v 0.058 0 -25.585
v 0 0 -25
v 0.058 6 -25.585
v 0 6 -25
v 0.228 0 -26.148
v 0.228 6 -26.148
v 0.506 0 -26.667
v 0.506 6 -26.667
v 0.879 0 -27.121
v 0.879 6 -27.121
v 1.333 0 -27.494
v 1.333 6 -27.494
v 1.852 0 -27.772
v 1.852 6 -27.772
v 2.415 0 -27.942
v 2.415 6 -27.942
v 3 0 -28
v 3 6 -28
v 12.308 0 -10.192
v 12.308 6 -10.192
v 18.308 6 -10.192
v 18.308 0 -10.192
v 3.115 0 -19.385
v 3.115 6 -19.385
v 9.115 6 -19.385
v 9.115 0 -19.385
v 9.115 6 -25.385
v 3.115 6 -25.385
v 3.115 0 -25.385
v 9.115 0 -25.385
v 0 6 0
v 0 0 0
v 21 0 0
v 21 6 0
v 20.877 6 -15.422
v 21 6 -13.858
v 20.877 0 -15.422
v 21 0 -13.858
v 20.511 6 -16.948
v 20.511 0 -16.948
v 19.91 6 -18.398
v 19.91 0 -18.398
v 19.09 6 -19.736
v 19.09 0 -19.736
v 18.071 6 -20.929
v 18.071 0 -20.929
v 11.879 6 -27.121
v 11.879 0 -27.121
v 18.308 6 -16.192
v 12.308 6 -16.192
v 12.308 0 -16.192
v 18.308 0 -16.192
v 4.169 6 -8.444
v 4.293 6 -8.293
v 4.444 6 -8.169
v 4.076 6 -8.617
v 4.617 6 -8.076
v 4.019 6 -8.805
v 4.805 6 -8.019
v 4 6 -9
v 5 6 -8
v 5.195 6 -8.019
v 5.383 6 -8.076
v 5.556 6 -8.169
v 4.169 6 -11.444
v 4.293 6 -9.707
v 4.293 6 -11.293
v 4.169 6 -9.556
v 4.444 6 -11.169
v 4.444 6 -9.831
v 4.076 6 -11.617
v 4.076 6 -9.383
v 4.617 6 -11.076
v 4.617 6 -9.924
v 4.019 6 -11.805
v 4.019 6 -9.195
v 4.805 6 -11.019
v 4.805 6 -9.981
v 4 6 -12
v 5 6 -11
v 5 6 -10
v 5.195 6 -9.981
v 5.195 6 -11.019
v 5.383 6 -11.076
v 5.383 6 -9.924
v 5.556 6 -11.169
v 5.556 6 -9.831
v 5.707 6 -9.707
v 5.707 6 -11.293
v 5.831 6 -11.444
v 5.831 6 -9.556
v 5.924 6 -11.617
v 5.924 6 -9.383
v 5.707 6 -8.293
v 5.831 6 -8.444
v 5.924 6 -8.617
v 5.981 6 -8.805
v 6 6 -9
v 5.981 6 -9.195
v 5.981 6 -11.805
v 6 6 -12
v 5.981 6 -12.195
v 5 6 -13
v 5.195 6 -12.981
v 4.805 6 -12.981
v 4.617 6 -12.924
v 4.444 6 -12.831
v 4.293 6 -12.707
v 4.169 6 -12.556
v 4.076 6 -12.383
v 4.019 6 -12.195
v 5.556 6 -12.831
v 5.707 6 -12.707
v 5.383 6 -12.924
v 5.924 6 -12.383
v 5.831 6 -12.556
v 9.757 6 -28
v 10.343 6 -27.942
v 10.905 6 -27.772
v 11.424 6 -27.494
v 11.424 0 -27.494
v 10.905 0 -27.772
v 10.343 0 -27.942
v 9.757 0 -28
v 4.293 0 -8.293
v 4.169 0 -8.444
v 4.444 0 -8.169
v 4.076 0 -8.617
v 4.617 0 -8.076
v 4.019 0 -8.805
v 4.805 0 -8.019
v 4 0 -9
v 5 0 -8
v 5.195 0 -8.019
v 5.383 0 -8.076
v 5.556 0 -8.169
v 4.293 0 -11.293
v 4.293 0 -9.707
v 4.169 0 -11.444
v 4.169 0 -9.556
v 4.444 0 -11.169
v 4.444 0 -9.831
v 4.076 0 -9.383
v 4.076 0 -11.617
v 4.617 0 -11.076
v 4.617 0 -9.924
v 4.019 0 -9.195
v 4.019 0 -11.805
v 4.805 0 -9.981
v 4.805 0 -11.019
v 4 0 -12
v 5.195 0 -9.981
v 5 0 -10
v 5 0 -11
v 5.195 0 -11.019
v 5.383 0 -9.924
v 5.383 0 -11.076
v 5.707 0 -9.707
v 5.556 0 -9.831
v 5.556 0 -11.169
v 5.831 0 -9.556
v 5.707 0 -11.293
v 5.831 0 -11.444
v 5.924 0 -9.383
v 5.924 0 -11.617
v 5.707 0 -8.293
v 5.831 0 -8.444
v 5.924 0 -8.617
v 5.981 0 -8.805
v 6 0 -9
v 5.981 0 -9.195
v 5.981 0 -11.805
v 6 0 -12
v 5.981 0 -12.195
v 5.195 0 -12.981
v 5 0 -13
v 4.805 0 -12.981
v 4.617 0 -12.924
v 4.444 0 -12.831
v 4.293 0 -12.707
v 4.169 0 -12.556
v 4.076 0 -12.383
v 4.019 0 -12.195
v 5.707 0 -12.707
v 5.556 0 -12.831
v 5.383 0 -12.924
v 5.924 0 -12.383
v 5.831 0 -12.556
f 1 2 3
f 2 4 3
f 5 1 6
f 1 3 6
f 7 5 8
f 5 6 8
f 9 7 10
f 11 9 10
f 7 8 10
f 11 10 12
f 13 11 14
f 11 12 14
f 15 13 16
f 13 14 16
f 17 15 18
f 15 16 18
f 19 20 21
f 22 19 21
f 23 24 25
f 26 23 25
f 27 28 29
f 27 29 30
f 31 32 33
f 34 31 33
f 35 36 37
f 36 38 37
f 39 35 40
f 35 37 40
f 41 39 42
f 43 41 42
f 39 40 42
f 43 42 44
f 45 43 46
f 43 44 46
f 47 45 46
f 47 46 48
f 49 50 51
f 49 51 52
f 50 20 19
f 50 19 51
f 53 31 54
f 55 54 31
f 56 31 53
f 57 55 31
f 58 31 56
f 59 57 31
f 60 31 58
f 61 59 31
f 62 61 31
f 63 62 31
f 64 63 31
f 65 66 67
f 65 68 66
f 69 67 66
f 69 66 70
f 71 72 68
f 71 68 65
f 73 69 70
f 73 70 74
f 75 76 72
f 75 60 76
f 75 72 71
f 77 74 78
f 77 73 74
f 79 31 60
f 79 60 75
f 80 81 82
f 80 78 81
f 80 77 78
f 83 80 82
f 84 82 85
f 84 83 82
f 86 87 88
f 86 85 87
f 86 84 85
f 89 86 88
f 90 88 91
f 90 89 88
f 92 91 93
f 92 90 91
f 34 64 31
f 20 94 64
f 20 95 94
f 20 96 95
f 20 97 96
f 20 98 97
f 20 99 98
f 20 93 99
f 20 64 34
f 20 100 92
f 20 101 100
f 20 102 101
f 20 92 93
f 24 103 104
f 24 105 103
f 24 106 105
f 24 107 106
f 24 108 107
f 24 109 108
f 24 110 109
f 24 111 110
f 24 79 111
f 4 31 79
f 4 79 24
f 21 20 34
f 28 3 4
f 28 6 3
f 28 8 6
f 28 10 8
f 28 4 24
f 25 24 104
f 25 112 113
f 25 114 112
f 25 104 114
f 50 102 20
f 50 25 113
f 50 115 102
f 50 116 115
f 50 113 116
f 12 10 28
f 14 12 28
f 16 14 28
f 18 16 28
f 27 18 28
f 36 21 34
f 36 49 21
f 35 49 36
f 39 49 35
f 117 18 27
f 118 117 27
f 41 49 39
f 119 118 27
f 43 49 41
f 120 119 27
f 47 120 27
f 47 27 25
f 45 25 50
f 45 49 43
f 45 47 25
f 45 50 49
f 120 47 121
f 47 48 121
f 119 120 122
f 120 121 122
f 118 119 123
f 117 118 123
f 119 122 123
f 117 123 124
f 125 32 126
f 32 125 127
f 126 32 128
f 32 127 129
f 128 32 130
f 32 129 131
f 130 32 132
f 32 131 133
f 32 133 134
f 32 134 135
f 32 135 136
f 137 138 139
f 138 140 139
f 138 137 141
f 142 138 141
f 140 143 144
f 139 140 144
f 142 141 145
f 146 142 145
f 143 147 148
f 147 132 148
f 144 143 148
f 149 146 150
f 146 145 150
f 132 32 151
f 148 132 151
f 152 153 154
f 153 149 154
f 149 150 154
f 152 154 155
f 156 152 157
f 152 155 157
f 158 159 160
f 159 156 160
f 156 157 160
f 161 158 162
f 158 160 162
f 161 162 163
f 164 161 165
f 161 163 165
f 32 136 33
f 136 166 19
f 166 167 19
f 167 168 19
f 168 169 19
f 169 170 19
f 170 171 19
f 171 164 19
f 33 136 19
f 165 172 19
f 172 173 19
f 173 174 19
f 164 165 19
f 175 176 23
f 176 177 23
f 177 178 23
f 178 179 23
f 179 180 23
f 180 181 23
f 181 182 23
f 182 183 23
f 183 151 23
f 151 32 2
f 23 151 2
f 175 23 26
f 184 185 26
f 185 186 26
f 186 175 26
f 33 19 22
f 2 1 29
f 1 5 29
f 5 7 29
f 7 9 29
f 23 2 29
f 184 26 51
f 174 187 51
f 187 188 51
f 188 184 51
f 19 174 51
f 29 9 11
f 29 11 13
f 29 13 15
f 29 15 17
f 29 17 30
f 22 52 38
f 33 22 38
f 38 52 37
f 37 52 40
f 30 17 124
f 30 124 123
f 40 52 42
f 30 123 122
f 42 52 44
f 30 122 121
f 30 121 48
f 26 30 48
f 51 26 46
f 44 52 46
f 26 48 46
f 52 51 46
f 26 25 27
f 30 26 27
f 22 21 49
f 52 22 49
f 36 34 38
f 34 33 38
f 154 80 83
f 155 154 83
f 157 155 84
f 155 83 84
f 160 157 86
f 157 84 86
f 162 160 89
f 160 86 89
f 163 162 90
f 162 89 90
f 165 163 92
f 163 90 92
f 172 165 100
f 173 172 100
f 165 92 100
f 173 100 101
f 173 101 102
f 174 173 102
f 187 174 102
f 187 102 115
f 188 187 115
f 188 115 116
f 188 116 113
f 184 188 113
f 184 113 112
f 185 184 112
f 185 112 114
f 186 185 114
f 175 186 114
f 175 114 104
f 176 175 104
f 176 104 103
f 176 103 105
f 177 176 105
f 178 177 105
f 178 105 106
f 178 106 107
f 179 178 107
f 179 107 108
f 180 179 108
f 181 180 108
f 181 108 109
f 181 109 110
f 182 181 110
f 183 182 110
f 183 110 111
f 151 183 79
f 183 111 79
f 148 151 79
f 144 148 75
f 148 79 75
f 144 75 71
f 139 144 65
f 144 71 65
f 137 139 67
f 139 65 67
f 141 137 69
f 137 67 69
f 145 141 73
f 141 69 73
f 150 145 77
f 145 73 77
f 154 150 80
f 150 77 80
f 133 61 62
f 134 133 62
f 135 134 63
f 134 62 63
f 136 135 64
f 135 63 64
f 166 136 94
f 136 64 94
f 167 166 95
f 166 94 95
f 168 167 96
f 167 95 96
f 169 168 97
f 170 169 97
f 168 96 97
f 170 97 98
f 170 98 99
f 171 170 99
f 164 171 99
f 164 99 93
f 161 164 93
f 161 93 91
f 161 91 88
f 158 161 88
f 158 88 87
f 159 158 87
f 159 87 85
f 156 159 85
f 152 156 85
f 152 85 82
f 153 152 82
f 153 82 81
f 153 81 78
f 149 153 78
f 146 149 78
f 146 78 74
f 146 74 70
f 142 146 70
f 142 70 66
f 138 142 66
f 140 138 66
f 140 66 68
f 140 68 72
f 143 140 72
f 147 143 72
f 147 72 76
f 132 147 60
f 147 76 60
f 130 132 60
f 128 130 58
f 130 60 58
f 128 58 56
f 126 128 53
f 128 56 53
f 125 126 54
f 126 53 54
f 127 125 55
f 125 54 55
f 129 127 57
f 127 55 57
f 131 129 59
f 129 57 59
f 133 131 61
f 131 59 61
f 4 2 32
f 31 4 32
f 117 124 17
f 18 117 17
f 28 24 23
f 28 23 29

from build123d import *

# Parameters (mm, degrees)
BOSS_EXTRUDE1_DEPTH = 6
SKETCH2_W           = 5
SKETCH2_H           = 5
CUT_EXTRUDE1_DEPTH  = 40.357337308
CUT_EXTRUDE2_DEPTH  = 40.357337308
SKETCH6_W           = 6
SKETCH6_H           = 6
CUT_EXTRUDE5_DEPTH  = 36.510561809
FILLET1_R           = 10
FILLET2_R           = 3
SKETCH5_R           = 1
CUT_EXTRUDE3_DEPTH  = 36.510561809


with BuildPart() as part:
    # Sketch1 → Boss-Extrude1 (new body)
    with BuildSketch(Plane(origin=(0, 0, 0), x_dir=(1, 0, 0), z_dir=(0, 1, 0))):
        Polygon((21, 0), (21, 9), (27, 9), (27, 28), (0, 28), (0, 0), align=None)
    extrude(amount=BOSS_EXTRUDE1_DEPTH)

    # Sketch2 → Cut-Extrude1 (cut, through all)
    with BuildSketch(Plane(origin=(0, 6, 0), x_dir=(1, 0, 0), z_dir=(0, 1, 0))):
        with Locations((5.615223689, 22.884776311)):
            Rectangle(SKETCH2_W, SKETCH2_H)
        with Locations((14.807611845, 13.692388155)):
            Rectangle(SKETCH2_W, SKETCH2_H)
    extrude(amount=-CUT_EXTRUDE1_DEPTH, mode=Mode.SUBTRACT)

    # Sketch3 → Cut-Extrude2 (cut, through all)
    with BuildSketch(Plane(origin=(0, 6, 0), x_dir=(1, 0, 0), z_dir=(0, 1, 0))):
        Polygon((21, 18), (11, 28), (33.43673633, 34.250964333), (36.08047681, 3.383507916), (21, 9), align=None)
    extrude(amount=-CUT_EXTRUDE2_DEPTH, mode=Mode.SUBTRACT)

    # Sketch6 → Cut-Extrude5 (cut, through all)
    with BuildSketch(Plane(origin=(0, 6, 0), x_dir=(1, 0, 0), z_dir=(0, 1, 0))):
        with Locations((6.115223689, 22.384776311)):
            Rectangle(SKETCH6_W, SKETCH6_H)
        with Locations((15.307611845, 13.192388155)):
            Rectangle(SKETCH6_W, SKETCH6_H)
    extrude(amount=-CUT_EXTRUDE5_DEPTH, mode=Mode.SUBTRACT)

    # Fillet1
    fillet1_edges = [part.edges().sort_by_distance(p)[0] for p in [
        (21, 3, -18),
    ]]
    fillet(fillet1_edges, radius=FILLET1_R)

    # Fillet2
    fillet2_edges = [part.edges().sort_by_distance(p)[0] for p in [
        (0, 3, -28),
        (11, 3, -28),
    ]]
    fillet(fillet2_edges, radius=FILLET2_R)

    # Sketch5 → Cut-Extrude3 (cut, through all)
    with BuildSketch(Plane(origin=(0, 6, 0), x_dir=(1, 0, 0), z_dir=(0, 1, 0))):
        with Locations(Location((5, 12, 0), (0, 0, 270))):
            Circle(SKETCH5_R)
        with Locations(Location((5, 9, 0), (0, 0, 270))):
            Circle(SKETCH5_R)
    extrude(amount=-CUT_EXTRUDE3_DEPTH, mode=Mode.SUBTRACT)


solid = part.part
